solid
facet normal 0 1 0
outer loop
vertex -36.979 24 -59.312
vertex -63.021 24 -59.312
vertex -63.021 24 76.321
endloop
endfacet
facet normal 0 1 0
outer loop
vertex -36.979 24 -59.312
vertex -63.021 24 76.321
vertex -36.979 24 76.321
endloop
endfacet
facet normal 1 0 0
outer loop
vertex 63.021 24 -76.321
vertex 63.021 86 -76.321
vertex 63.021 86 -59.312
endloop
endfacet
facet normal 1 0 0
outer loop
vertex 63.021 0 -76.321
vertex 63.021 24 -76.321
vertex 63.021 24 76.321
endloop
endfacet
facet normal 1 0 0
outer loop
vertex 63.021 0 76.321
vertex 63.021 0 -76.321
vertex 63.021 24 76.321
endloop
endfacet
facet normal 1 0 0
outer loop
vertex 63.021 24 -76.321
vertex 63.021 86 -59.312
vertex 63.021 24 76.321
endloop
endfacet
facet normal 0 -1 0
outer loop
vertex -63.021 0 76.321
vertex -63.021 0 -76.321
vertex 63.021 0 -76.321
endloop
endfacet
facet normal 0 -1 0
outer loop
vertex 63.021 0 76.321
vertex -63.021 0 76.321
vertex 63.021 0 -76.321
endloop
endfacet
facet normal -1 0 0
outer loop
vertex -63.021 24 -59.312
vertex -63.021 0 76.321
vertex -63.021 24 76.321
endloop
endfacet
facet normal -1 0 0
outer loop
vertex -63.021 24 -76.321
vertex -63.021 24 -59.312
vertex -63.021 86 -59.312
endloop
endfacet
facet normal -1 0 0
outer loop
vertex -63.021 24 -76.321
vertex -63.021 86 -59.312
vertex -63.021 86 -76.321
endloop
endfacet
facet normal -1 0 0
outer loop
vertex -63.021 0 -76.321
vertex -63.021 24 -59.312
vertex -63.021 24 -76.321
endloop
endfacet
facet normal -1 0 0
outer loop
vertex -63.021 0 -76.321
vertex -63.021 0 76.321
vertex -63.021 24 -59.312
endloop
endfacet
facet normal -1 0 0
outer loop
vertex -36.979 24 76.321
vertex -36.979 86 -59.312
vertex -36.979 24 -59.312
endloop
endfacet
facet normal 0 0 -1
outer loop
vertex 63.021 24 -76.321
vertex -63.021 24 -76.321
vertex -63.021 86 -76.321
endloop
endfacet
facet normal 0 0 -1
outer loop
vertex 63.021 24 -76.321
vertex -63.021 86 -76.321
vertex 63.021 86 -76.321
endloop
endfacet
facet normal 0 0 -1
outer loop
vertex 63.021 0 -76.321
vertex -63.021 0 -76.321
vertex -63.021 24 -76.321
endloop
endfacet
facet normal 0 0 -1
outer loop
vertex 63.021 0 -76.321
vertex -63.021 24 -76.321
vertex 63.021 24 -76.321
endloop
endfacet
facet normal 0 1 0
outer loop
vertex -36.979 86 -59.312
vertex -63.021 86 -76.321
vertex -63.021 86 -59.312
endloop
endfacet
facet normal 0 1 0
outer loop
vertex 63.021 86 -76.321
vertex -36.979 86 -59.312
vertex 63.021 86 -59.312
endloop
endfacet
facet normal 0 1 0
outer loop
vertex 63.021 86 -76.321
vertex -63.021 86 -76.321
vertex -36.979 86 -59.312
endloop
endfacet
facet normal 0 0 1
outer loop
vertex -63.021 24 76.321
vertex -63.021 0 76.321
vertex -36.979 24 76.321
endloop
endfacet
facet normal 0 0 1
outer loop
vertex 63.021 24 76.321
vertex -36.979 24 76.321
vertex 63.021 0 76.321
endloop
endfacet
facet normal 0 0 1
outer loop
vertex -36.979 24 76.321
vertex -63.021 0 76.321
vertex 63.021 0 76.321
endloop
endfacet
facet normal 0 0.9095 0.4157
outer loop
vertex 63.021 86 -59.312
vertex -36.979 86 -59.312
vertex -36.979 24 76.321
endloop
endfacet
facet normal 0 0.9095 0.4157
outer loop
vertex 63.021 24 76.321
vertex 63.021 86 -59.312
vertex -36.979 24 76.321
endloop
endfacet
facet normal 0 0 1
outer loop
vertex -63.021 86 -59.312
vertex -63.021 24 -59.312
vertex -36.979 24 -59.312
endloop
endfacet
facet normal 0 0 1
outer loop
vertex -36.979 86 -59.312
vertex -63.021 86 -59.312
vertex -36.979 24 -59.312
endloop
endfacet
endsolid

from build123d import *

# Parameters (mm, degrees)
SKETCH1_W           = 126.042151156
SKETCH1_H           = 152.641955782
BOSS_EXTRUDE1_DEPTH = 24
SKETCH2_W           = 126.042151156
SKETCH2_H           = 17.009297173
BOSS_EXTRUDE2_DEPTH = 62
RIB1_REACH          = 172.609
SKETCH3_WALL_W      = 492.350042414
SKETCH3_WALL_H      = 100


with BuildPart() as part:
    # Sketch1 → Boss-Extrude1 (new body)
    with BuildSketch(Plane(origin=(0, 0, 0), x_dir=(1, 0, 0), z_dir=(0, 1, 0))):
        Rectangle(SKETCH1_W, SKETCH1_H)
    extrude(amount=BOSS_EXTRUDE1_DEPTH)

    # Sketch2 → Boss-Extrude2 (add)
    with BuildSketch(Plane(origin=(0, 24, 0), x_dir=(1, 0, 0), z_dir=(0, 1, 0))):
        with Locations((0, 67.816329305)):
            Rectangle(SKETCH2_W, SKETCH2_H)
    extrude(amount=BOSS_EXTRUDE2_DEPTH)

    # Sketch3 wall → Rib1 (add, up to next)
    with BuildSketch(Plane(origin=(63.021075578, 55, 8.504648587), x_dir=(0, -0.415740341777, 0.909483352359), z_dir=(0, -0.909483352359, -0.415740341777)), mode=Mode.PRIVATE) as rib1_sk1:
        with Locations((0, 50)):
            Rectangle(SKETCH3_WALL_W, SKETCH3_WALL_H)
    rib1_tool1 = extrude(rib1_sk1.sketch, amount=RIB1_REACH, mode=Mode.PRIVATE) - part.part
    add(rib1_tool1.solids().sort_by_distance((63.021075578, 55, 8.504648587))[0])


solid = part.part
